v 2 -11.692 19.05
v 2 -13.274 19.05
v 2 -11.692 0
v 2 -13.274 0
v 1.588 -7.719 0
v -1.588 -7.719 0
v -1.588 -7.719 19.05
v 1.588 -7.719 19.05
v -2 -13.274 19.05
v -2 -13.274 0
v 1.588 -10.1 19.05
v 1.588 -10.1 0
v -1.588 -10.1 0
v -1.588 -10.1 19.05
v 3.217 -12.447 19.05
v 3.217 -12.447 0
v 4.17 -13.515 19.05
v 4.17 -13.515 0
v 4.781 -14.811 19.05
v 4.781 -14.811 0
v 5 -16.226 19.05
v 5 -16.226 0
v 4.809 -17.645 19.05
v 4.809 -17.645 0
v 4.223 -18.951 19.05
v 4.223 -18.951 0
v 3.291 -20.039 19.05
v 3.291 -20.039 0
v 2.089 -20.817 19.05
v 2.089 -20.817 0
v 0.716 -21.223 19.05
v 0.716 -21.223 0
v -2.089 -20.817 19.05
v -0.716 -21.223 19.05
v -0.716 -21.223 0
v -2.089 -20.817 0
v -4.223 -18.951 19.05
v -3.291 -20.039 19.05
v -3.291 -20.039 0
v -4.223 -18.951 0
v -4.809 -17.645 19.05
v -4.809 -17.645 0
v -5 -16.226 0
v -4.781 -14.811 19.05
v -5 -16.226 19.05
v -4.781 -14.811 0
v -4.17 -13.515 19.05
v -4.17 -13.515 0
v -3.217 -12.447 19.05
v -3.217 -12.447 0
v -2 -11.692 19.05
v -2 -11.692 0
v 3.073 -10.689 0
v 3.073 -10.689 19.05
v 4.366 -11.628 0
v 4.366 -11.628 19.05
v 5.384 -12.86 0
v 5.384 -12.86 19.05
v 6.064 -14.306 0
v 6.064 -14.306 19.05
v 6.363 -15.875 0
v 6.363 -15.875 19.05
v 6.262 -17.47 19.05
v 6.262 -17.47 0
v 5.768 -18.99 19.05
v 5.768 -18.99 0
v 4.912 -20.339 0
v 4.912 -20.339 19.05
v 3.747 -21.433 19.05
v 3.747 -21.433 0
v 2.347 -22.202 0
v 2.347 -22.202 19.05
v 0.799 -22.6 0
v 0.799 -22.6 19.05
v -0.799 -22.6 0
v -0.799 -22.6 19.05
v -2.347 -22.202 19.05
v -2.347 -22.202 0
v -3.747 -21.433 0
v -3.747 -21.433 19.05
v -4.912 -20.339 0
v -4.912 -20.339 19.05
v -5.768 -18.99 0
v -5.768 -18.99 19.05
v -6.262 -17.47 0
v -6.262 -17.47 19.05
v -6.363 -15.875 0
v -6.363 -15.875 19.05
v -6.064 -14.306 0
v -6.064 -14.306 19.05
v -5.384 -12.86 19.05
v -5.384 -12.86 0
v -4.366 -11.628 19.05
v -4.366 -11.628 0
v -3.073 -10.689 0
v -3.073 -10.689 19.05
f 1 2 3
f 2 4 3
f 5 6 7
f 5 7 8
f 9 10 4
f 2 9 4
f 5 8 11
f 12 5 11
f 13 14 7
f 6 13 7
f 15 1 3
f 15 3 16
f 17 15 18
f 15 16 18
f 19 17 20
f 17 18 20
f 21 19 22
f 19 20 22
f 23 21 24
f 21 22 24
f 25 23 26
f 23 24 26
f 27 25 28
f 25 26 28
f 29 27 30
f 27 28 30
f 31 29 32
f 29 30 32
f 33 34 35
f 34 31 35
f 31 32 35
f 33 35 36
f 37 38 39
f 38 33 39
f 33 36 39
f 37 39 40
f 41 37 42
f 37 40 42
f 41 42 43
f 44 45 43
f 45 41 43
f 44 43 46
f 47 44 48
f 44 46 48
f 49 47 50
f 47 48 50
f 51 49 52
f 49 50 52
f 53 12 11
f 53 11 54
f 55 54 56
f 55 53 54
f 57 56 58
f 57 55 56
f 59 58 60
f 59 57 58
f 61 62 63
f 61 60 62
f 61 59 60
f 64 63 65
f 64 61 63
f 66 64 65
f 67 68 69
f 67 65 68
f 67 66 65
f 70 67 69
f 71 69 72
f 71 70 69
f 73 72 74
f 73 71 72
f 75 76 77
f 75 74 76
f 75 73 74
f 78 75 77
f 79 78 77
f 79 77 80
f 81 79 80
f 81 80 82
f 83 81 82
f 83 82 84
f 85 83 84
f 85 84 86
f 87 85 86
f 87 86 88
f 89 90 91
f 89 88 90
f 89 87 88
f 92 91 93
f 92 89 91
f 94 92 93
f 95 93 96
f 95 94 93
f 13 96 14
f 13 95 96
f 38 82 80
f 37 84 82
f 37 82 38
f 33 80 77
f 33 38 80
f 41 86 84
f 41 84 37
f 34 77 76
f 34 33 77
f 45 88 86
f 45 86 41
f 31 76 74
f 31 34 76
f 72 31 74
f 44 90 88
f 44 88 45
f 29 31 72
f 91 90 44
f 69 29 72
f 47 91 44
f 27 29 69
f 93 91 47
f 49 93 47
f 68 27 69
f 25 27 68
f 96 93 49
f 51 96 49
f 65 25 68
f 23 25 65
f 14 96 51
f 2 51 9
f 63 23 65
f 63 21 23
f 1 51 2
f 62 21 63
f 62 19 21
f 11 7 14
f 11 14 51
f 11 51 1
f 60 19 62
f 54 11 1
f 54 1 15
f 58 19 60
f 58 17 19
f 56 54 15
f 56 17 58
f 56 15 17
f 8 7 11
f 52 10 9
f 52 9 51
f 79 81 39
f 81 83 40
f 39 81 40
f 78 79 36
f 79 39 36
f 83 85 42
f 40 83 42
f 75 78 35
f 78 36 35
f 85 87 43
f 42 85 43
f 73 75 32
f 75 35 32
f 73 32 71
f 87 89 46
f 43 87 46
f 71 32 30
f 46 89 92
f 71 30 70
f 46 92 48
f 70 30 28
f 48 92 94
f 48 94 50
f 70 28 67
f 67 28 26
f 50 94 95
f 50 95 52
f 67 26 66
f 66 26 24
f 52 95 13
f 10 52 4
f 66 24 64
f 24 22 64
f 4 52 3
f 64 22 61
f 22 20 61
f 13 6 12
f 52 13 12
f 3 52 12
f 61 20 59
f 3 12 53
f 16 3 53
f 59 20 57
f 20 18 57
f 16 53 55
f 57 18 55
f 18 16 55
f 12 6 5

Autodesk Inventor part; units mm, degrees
ref_plane "YZ Plane" through (0, 0, 0) normal (1, 0, 0) x (0, 1, 0)
ref_plane "XZ Plane" through (0, 0, 0) normal (0, 1, 0) x (-1, 0, 0)
ref_plane "XY Plane" through (0, 0, 0) normal (0, 0, 1) x (1, 0, 0)
sketch "Sketch1" plane through (0, 0, 0) normal (0, 0, 1) x (1, 0, 0)
  arc A0 (-1.5875, -10.0999) -> (1.5875, -10.0999) centre (0, -16.2745) ccw
  line L0 (-1.5875, -10.0999) -> (-1.5875, -7.7187)
  line L1 (-1.5875, -7.7187) -> (1.5875, -7.7187)
  line L2 (1.5875, -7.7187) -> (1.5875, -10.0999)
  arc A1 (5.0716, -2.4388) -> (6.1971, -2.905) centre (6.228, -1.2388) ccw
  arc A2 (5.0716, -2.4388) -> (0.6091, -1.5512) centre (0, -16.2745) ccw
  arc A3 (-0.6091, -1.5512) -> (0.6091, -1.5512) centre (0, 0) ccw
  arc A4 (-0.6091, -1.5512) -> (-5.0716, -2.4388) centre (0, -16.2745) ccw
  arc A5 (-6.1971, -2.905) -> (-5.0716, -2.4388) centre (-6.228, -1.2388) ccw
  arc A6 (-6.1971, -2.905) -> (-9.9802, -5.4328) centre (0, -16.2745) ccw
  arc A7 (-10.8417, -6.2943) -> (-9.9802, -5.4328) centre (-11.5078, -4.7667) ccw
  arc A8 (-10.8417, -6.2943) -> (-13.3695, -10.0774) centre (0, -16.2745) ccw
  arc A9 (-13.8357, -11.2029) -> (-13.3695, -10.0774) centre (-15.0357, -10.0465) ccw
  arc A10 (-13.8357, -11.2029) -> (-14.7233, -15.6654) centre (0, -16.2745) ccw
  arc A11 (-14.7233, -16.8837) -> (-14.7233, -15.6654) centre (-16.2745, -16.2745) ccw
  arc A12 (-14.7233, -16.8837) -> (-13.8357, -21.3461) centre (0, -16.2745) ccw
  arc A13 (-13.3695, -22.4717) -> (-13.8357, -21.3461) centre (-15.0357, -22.5025) ccw
  arc A14 (-13.3695, -22.4717) -> (-10.8417, -26.2548) centre (0, -16.2745) ccw
  arc A15 (-9.9802, -27.1162) -> (-10.8417, -26.2548) centre (-11.5078, -27.7823) ccw
  arc A16 (-9.9802, -27.1162) -> (-6.1971, -29.644) centre (0, -16.2745) ccw
  arc A17 (-5.0716, -30.1102) -> (-6.1971, -29.644) centre (-6.228, -31.3102) ccw
  arc A18 (-5.0716, -30.1102) -> (-0.6091, -30.9978) centre (0, -16.2745) ccw
  arc A19 (0.6091, -30.9978) -> (-0.6091, -30.9978) centre (0, -32.549) ccw
  arc A20 (0.6091, -30.9978) -> (5.0716, -30.1102) centre (0, -16.2745) ccw
  arc A21 (6.1971, -29.644) -> (5.0716, -30.1102) centre (6.228, -31.3102) ccw
  arc A22 (6.1971, -29.644) -> (9.9802, -27.1162) centre (0, -16.2745) ccw
  arc A23 (10.8417, -26.2548) -> (9.9802, -27.1162) centre (11.5078, -27.7823) ccw
  arc A24 (10.8417, -26.2548) -> (13.3695, -22.4717) centre (0, -16.2745) ccw
  arc A25 (13.8357, -21.3461) -> (13.3695, -22.4717) centre (15.0357, -22.5025) ccw
  arc A26 (13.8357, -21.3461) -> (14.7233, -16.8837) centre (0, -16.2745) ccw
  arc A27 (14.7233, -15.6654) -> (14.7233, -16.8837) centre (16.2745, -16.2745) ccw
  arc A28 (14.7233, -15.6654) -> (13.8357, -11.2029) centre (0, -16.2745) ccw
  arc A29 (13.3695, -10.0774) -> (13.8357, -11.2029) centre (15.0357, -10.0465) ccw
  arc A30 (13.3695, -10.0774) -> (10.8417, -6.2943) centre (0, -16.2745) ccw
  arc A31 (9.9802, -5.4328) -> (10.8417, -6.2943) centre (11.5078, -4.7667) ccw
  arc A32 (9.9802, -5.4328) -> (6.1971, -2.905) centre (0, -16.2745) ccw
  line L3 (-2, -13.2745) -> (-2, -11.6919)
  arc A33 (-2, -11.6919) -> (2, -11.6919) centre (0, -16.2745) ccw
  line L4 (2, -13.2745) -> (2, -11.6919)
  line L5 (-2, -13.2745) -> (2, -13.2745)
extrude "Extrusion1" add sketch "Sketch1" along normal blind 19.05 contours L0 L1 L2 A0
properties part number "PG71 Adapter" material "Brass, Soft Yellow"
